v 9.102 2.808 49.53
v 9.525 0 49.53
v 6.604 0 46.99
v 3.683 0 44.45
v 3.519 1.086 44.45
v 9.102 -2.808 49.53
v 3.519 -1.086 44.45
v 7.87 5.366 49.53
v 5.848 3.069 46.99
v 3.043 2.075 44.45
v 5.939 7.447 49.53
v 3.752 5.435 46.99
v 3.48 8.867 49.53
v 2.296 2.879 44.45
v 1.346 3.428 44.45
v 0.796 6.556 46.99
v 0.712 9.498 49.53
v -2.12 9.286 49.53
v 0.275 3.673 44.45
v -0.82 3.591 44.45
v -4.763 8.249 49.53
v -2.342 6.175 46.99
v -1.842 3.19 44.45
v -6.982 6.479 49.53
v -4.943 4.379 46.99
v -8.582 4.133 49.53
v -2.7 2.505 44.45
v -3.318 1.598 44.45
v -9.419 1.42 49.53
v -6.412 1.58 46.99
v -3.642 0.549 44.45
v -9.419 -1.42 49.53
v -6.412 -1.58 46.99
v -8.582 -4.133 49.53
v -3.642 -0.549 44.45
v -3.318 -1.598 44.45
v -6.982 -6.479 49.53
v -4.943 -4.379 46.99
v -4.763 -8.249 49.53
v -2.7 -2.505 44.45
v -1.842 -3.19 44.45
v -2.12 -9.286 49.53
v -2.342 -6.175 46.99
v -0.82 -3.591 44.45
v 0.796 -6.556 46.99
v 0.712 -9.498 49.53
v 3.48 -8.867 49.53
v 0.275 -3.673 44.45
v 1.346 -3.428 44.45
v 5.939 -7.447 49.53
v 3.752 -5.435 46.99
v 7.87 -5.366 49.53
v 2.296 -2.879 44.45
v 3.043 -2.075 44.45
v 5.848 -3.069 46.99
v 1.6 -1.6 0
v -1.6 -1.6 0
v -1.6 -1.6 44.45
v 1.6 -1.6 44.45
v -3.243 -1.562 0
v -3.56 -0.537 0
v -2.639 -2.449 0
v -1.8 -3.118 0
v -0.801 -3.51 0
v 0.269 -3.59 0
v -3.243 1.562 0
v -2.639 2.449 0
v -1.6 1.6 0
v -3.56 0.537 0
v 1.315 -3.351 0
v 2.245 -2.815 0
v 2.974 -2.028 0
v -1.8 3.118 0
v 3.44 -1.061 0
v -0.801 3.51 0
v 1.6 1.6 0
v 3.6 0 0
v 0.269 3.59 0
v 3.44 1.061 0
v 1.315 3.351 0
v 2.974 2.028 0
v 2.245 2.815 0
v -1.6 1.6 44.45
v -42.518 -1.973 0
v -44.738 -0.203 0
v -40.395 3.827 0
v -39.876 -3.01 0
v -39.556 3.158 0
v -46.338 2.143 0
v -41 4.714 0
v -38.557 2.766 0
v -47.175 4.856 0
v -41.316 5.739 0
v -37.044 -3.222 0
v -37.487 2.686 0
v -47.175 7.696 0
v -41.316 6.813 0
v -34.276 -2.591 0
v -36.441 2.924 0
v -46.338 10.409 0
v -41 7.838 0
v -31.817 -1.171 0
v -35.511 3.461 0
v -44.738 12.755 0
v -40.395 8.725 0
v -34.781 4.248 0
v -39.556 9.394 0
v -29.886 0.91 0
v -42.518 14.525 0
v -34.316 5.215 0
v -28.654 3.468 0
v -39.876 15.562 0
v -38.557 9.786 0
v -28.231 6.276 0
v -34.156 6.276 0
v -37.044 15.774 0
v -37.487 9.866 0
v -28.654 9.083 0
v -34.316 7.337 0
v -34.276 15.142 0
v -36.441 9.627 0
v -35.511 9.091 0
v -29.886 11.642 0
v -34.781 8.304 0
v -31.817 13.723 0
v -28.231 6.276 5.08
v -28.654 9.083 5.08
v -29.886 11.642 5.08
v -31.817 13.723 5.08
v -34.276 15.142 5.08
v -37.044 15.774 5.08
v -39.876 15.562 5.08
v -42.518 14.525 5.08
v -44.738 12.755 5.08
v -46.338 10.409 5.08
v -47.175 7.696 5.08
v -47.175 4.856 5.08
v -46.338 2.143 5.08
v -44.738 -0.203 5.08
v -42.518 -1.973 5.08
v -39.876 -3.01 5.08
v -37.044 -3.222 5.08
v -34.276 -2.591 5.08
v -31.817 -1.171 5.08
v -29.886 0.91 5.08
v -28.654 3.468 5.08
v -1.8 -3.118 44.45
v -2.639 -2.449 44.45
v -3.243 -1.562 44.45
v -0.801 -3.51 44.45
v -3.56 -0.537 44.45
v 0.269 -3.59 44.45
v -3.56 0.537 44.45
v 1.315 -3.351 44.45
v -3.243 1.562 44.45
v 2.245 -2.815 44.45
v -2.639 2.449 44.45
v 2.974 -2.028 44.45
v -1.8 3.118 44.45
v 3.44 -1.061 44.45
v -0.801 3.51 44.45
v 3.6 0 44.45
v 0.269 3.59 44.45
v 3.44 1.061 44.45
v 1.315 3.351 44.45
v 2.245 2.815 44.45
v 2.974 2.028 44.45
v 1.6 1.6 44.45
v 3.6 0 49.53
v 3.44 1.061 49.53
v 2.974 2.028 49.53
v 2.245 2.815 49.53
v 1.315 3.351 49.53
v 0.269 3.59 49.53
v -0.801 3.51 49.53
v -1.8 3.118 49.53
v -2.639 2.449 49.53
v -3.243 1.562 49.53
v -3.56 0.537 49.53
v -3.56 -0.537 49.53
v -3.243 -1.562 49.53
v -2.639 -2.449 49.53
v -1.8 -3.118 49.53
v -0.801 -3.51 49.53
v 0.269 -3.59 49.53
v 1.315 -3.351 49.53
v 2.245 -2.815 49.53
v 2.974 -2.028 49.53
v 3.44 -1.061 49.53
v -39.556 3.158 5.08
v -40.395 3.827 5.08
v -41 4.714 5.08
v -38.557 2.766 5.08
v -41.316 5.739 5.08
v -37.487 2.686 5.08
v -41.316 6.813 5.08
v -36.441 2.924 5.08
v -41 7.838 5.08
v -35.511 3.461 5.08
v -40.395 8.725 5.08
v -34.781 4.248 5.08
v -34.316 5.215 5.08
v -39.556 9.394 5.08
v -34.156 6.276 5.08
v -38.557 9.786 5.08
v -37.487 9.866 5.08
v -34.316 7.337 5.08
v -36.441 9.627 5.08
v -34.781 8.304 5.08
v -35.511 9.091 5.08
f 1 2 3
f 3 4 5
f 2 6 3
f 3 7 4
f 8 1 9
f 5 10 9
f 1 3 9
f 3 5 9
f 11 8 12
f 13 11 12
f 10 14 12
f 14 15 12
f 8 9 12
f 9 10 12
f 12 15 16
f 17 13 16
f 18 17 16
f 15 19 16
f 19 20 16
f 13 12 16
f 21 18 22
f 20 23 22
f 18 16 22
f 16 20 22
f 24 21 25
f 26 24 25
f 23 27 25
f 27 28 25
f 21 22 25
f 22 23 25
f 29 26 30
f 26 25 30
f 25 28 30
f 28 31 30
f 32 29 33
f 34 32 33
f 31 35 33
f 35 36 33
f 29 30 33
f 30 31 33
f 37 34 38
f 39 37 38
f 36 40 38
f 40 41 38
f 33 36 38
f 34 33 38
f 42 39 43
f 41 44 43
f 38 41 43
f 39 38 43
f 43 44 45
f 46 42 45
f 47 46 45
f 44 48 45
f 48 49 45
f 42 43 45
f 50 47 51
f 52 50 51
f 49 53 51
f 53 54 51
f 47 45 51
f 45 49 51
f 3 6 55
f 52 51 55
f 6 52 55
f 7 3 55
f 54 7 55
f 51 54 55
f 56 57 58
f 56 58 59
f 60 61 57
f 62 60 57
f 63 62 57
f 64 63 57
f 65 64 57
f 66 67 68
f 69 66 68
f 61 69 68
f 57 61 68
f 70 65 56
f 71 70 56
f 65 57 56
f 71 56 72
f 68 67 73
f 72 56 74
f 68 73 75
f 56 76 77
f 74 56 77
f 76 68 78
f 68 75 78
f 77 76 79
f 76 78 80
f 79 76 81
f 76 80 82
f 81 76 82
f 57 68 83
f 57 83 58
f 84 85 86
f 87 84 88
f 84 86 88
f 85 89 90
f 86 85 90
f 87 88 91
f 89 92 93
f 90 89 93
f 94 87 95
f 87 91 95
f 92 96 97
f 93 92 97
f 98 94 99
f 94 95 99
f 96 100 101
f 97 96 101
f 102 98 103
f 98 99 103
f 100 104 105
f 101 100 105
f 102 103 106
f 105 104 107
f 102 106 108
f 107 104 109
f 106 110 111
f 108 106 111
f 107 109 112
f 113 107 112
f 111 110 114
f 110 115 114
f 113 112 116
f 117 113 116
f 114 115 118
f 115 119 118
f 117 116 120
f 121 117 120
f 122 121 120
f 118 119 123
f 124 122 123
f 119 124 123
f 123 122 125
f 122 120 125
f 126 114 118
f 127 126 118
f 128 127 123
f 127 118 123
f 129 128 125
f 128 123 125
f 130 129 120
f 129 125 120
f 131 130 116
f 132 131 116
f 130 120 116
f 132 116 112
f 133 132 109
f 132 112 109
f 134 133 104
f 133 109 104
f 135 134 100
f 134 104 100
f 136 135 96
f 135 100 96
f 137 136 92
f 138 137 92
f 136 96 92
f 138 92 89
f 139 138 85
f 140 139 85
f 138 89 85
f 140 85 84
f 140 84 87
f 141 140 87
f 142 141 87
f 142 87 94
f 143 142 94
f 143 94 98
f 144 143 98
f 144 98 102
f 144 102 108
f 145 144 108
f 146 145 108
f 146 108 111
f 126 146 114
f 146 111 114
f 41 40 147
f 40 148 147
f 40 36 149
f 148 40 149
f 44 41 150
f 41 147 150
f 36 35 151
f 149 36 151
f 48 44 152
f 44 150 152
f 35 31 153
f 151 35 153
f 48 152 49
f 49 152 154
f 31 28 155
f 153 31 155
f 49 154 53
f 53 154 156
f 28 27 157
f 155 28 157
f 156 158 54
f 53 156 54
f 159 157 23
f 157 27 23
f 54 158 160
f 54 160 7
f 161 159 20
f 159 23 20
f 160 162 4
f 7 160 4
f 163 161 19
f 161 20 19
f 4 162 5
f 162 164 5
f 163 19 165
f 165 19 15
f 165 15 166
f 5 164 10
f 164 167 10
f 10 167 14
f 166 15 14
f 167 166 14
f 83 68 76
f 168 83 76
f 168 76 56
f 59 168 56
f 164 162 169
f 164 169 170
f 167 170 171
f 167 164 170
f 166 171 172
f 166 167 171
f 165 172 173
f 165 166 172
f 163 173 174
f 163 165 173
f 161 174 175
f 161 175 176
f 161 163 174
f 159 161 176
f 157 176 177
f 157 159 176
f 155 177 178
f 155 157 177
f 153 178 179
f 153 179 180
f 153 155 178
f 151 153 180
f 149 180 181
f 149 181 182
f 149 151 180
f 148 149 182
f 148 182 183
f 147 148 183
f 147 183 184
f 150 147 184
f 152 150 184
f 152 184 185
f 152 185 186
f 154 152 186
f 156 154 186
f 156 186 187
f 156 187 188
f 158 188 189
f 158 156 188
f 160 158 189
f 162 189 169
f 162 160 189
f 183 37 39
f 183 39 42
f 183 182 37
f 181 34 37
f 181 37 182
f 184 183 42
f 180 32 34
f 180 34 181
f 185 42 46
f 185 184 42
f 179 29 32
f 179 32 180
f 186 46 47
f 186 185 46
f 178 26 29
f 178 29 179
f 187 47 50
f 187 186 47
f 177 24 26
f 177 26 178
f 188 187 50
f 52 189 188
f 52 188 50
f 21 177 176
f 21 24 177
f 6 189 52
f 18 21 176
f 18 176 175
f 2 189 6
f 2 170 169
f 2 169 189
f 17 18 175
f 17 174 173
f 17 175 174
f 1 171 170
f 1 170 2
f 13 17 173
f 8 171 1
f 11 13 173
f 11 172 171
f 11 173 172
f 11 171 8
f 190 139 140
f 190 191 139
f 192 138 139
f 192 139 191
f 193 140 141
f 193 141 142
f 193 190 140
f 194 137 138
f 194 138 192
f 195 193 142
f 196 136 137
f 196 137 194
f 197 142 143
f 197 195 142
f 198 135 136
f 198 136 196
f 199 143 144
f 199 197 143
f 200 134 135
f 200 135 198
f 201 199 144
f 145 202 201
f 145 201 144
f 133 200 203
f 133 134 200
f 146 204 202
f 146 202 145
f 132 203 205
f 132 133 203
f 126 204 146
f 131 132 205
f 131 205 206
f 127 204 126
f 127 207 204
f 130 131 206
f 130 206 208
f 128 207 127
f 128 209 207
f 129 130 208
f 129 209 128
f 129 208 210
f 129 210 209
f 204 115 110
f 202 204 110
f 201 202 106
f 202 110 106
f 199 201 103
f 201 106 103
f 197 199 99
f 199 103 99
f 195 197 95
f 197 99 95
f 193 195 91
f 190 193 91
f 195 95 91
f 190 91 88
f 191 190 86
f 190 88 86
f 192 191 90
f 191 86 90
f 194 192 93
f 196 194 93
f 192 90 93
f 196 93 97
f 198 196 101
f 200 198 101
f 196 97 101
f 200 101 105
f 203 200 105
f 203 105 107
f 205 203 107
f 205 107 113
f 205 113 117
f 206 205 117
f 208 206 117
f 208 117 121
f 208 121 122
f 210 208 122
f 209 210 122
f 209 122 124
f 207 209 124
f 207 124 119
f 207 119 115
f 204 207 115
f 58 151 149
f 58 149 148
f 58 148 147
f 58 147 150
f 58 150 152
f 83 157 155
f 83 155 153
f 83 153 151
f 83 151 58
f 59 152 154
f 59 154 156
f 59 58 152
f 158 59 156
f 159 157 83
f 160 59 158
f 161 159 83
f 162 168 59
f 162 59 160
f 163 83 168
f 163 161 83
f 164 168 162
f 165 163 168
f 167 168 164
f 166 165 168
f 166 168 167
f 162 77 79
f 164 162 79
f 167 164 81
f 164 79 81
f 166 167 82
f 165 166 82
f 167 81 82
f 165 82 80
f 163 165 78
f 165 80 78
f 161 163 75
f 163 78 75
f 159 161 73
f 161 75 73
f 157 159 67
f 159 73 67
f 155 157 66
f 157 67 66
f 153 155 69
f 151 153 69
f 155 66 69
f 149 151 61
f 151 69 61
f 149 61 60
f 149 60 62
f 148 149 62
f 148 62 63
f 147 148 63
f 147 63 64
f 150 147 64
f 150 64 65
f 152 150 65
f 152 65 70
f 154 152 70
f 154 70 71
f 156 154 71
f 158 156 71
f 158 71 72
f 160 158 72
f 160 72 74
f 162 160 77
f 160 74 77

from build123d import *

# Parameters (mm, degrees)
F0_R      = 3.6000055
F1_DEPTH  = 44.45
F2_W      = 3.1999936
F2_H      = 3.1999936
F3_DEPTH  = 45.466
F4_R      = 9.525
F4_R_2    = 3.6000055
F5_DEPTH  = 5.08
F6_SIZE2  = 5.84199
F6_SIZE   = 5.07999
F7_R      = 9.525
F8_DEPTH  = 5.08
F9_R      = 3.60045
F10_DEPTH = 6.096


# Not quite as in the source:
# - a fillet or chamfer is up to 0.001 mm smaller than in the source, because OpenCascade refuses the exact size


with BuildPart() as f1:
    # F0 (on Top) → F1 (new body)
    with BuildSketch(Plane.XY):
        Circle(F0_R)
    extrude(amount=F1_DEPTH)

    # F2 (on face) → F3 (cut)
    with BuildSketch(Plane(origin=(0, 0, 0), x_dir=(1, 0, 0), z_dir=(0, 0, -1))):
        Rectangle(F2_W, F2_H)
    extrude(amount=-F3_DEPTH, mode=Mode.SUBTRACT)


with BuildPart() as f5:
    # F4 (on face) → F5 (new body)
    with BuildSketch(Plane.XY.offset(44.45)):
        Circle(F4_R)
        Circle(F4_R_2, mode=Mode.SUBTRACT)
    extrude(amount=F5_DEPTH)

    # F6 (size 5.08 and 5.842 in the source; OpenCascade refuses exactly that, so slightly less here)
    f6_edges = [f5.edges().sort_by_distance(p)[0] for p in [
        (-9.525, 0, 44.45),
    ]]
    f6_side = f5.faces().sort_by_distance((-9.525, 0, 46.99))[0]
    chamfer(f6_edges, length=F6_SIZE, length2=F6_SIZE2, reference=f6_side)


with BuildPart() as f8:
    # F7 (on Top) → F8 (new body)
    with BuildSketch(Plane.XY):
        with Locations((-37.7559922636, 6.275920663)):
            Circle(F7_R)
    extrude(amount=F8_DEPTH)

    # F9 (on face) → F10 (cut)
    with BuildSketch(Plane(origin=(0, 0, 0), x_dir=(1, 0, 0), z_dir=(0, 0, -1))):
        with Locations((-37.7559922636, -6.275920663)):
            Circle(F9_R)
    extrude(amount=-F10_DEPTH, mode=Mode.SUBTRACT)


solid = Compound([f1.part, f5.part, f8.part])
